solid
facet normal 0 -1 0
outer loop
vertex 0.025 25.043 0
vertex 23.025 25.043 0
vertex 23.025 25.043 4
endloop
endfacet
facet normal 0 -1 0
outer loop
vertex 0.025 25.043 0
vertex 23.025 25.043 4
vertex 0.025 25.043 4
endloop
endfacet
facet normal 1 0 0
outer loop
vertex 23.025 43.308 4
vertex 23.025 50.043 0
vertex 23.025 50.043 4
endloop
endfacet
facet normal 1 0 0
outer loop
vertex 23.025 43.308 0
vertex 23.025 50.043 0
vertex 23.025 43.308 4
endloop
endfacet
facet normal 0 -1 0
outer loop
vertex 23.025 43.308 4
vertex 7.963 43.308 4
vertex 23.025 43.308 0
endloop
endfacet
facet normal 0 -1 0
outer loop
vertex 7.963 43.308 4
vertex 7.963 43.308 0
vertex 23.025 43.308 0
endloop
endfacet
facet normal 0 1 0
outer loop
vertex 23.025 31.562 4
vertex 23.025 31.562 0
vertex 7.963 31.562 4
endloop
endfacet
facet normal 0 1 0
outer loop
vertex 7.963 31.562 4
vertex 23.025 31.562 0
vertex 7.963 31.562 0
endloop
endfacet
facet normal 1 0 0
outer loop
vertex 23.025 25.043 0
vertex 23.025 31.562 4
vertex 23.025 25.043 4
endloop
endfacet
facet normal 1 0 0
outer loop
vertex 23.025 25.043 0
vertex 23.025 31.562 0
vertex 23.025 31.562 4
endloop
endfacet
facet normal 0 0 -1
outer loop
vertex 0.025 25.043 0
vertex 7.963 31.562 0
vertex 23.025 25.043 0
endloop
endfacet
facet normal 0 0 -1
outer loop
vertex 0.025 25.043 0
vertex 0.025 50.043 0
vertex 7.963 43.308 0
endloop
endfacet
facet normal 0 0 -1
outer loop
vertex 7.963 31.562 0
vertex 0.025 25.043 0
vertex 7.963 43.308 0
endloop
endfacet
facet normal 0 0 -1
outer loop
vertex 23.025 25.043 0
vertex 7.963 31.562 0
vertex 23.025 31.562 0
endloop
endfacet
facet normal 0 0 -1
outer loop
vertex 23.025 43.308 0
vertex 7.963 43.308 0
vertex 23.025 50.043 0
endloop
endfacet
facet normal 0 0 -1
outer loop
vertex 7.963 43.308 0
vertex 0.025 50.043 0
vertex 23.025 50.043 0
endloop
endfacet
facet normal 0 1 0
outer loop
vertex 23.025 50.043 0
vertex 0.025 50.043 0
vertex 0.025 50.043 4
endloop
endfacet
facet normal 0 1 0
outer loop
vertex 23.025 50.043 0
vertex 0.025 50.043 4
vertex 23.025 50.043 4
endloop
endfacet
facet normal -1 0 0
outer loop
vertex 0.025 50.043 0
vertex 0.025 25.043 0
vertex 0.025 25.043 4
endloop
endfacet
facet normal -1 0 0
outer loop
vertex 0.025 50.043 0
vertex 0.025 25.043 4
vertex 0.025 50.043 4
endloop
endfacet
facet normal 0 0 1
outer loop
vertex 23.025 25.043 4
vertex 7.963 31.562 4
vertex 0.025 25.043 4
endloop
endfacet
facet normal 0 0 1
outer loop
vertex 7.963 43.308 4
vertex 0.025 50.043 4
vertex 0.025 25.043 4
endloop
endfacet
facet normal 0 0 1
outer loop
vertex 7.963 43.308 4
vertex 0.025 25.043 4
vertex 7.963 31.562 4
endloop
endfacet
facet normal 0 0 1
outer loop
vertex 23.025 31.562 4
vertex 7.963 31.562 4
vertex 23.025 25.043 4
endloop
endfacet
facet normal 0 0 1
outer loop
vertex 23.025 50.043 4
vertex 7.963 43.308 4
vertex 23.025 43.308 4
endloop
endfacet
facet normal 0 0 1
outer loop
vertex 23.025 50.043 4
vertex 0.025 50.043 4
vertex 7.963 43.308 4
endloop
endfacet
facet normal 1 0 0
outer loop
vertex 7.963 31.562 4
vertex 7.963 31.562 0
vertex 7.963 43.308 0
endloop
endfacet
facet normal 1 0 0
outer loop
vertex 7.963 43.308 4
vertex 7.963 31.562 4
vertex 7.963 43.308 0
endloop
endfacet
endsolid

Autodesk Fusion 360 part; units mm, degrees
sketch "Sketch1" plane through (0, 0, 0) normal (0, 0, 1) x (1, 0, 0)
  line L0 (0.0247, 50.0428) -> (30.0247, 50.0428)
  line L1 (30.0247, 50.0428) -> (30.0247, 25.0428)
  line L2 (30.0247, 25.0428) -> (0.0247, 25.0428)
  line L3 (0.0247, 25.0428) -> (0.0247, 50.0428)
  dimension "d3" = 30
  dimension "d4" = 25
extrude "Extrude1" add sketch "Sketch1" along normal blind 4
sketch "Sketch2" plane through (0, 0, 0) normal (0, 0, 1) x (1, 0, 0)
  line L0 (7.9626, 43.3083) -> (30.0026, 43.3083)
  line L1 (30.0026, 43.3083) -> (30.0026, 31.5625)
  line L2 (30.0026, 31.5625) -> (7.9626, 31.5625)
  line L3 (7.9626, 31.5625) -> (7.9626, 43.3083)
extrude "Extrude2" cut sketch "Sketch2" along normal blind 4
extrude "Extrude3" cut 1 faces at (30.0247, 41.7095, 1.3333) along direction (-1, 0, 0) blind 7
